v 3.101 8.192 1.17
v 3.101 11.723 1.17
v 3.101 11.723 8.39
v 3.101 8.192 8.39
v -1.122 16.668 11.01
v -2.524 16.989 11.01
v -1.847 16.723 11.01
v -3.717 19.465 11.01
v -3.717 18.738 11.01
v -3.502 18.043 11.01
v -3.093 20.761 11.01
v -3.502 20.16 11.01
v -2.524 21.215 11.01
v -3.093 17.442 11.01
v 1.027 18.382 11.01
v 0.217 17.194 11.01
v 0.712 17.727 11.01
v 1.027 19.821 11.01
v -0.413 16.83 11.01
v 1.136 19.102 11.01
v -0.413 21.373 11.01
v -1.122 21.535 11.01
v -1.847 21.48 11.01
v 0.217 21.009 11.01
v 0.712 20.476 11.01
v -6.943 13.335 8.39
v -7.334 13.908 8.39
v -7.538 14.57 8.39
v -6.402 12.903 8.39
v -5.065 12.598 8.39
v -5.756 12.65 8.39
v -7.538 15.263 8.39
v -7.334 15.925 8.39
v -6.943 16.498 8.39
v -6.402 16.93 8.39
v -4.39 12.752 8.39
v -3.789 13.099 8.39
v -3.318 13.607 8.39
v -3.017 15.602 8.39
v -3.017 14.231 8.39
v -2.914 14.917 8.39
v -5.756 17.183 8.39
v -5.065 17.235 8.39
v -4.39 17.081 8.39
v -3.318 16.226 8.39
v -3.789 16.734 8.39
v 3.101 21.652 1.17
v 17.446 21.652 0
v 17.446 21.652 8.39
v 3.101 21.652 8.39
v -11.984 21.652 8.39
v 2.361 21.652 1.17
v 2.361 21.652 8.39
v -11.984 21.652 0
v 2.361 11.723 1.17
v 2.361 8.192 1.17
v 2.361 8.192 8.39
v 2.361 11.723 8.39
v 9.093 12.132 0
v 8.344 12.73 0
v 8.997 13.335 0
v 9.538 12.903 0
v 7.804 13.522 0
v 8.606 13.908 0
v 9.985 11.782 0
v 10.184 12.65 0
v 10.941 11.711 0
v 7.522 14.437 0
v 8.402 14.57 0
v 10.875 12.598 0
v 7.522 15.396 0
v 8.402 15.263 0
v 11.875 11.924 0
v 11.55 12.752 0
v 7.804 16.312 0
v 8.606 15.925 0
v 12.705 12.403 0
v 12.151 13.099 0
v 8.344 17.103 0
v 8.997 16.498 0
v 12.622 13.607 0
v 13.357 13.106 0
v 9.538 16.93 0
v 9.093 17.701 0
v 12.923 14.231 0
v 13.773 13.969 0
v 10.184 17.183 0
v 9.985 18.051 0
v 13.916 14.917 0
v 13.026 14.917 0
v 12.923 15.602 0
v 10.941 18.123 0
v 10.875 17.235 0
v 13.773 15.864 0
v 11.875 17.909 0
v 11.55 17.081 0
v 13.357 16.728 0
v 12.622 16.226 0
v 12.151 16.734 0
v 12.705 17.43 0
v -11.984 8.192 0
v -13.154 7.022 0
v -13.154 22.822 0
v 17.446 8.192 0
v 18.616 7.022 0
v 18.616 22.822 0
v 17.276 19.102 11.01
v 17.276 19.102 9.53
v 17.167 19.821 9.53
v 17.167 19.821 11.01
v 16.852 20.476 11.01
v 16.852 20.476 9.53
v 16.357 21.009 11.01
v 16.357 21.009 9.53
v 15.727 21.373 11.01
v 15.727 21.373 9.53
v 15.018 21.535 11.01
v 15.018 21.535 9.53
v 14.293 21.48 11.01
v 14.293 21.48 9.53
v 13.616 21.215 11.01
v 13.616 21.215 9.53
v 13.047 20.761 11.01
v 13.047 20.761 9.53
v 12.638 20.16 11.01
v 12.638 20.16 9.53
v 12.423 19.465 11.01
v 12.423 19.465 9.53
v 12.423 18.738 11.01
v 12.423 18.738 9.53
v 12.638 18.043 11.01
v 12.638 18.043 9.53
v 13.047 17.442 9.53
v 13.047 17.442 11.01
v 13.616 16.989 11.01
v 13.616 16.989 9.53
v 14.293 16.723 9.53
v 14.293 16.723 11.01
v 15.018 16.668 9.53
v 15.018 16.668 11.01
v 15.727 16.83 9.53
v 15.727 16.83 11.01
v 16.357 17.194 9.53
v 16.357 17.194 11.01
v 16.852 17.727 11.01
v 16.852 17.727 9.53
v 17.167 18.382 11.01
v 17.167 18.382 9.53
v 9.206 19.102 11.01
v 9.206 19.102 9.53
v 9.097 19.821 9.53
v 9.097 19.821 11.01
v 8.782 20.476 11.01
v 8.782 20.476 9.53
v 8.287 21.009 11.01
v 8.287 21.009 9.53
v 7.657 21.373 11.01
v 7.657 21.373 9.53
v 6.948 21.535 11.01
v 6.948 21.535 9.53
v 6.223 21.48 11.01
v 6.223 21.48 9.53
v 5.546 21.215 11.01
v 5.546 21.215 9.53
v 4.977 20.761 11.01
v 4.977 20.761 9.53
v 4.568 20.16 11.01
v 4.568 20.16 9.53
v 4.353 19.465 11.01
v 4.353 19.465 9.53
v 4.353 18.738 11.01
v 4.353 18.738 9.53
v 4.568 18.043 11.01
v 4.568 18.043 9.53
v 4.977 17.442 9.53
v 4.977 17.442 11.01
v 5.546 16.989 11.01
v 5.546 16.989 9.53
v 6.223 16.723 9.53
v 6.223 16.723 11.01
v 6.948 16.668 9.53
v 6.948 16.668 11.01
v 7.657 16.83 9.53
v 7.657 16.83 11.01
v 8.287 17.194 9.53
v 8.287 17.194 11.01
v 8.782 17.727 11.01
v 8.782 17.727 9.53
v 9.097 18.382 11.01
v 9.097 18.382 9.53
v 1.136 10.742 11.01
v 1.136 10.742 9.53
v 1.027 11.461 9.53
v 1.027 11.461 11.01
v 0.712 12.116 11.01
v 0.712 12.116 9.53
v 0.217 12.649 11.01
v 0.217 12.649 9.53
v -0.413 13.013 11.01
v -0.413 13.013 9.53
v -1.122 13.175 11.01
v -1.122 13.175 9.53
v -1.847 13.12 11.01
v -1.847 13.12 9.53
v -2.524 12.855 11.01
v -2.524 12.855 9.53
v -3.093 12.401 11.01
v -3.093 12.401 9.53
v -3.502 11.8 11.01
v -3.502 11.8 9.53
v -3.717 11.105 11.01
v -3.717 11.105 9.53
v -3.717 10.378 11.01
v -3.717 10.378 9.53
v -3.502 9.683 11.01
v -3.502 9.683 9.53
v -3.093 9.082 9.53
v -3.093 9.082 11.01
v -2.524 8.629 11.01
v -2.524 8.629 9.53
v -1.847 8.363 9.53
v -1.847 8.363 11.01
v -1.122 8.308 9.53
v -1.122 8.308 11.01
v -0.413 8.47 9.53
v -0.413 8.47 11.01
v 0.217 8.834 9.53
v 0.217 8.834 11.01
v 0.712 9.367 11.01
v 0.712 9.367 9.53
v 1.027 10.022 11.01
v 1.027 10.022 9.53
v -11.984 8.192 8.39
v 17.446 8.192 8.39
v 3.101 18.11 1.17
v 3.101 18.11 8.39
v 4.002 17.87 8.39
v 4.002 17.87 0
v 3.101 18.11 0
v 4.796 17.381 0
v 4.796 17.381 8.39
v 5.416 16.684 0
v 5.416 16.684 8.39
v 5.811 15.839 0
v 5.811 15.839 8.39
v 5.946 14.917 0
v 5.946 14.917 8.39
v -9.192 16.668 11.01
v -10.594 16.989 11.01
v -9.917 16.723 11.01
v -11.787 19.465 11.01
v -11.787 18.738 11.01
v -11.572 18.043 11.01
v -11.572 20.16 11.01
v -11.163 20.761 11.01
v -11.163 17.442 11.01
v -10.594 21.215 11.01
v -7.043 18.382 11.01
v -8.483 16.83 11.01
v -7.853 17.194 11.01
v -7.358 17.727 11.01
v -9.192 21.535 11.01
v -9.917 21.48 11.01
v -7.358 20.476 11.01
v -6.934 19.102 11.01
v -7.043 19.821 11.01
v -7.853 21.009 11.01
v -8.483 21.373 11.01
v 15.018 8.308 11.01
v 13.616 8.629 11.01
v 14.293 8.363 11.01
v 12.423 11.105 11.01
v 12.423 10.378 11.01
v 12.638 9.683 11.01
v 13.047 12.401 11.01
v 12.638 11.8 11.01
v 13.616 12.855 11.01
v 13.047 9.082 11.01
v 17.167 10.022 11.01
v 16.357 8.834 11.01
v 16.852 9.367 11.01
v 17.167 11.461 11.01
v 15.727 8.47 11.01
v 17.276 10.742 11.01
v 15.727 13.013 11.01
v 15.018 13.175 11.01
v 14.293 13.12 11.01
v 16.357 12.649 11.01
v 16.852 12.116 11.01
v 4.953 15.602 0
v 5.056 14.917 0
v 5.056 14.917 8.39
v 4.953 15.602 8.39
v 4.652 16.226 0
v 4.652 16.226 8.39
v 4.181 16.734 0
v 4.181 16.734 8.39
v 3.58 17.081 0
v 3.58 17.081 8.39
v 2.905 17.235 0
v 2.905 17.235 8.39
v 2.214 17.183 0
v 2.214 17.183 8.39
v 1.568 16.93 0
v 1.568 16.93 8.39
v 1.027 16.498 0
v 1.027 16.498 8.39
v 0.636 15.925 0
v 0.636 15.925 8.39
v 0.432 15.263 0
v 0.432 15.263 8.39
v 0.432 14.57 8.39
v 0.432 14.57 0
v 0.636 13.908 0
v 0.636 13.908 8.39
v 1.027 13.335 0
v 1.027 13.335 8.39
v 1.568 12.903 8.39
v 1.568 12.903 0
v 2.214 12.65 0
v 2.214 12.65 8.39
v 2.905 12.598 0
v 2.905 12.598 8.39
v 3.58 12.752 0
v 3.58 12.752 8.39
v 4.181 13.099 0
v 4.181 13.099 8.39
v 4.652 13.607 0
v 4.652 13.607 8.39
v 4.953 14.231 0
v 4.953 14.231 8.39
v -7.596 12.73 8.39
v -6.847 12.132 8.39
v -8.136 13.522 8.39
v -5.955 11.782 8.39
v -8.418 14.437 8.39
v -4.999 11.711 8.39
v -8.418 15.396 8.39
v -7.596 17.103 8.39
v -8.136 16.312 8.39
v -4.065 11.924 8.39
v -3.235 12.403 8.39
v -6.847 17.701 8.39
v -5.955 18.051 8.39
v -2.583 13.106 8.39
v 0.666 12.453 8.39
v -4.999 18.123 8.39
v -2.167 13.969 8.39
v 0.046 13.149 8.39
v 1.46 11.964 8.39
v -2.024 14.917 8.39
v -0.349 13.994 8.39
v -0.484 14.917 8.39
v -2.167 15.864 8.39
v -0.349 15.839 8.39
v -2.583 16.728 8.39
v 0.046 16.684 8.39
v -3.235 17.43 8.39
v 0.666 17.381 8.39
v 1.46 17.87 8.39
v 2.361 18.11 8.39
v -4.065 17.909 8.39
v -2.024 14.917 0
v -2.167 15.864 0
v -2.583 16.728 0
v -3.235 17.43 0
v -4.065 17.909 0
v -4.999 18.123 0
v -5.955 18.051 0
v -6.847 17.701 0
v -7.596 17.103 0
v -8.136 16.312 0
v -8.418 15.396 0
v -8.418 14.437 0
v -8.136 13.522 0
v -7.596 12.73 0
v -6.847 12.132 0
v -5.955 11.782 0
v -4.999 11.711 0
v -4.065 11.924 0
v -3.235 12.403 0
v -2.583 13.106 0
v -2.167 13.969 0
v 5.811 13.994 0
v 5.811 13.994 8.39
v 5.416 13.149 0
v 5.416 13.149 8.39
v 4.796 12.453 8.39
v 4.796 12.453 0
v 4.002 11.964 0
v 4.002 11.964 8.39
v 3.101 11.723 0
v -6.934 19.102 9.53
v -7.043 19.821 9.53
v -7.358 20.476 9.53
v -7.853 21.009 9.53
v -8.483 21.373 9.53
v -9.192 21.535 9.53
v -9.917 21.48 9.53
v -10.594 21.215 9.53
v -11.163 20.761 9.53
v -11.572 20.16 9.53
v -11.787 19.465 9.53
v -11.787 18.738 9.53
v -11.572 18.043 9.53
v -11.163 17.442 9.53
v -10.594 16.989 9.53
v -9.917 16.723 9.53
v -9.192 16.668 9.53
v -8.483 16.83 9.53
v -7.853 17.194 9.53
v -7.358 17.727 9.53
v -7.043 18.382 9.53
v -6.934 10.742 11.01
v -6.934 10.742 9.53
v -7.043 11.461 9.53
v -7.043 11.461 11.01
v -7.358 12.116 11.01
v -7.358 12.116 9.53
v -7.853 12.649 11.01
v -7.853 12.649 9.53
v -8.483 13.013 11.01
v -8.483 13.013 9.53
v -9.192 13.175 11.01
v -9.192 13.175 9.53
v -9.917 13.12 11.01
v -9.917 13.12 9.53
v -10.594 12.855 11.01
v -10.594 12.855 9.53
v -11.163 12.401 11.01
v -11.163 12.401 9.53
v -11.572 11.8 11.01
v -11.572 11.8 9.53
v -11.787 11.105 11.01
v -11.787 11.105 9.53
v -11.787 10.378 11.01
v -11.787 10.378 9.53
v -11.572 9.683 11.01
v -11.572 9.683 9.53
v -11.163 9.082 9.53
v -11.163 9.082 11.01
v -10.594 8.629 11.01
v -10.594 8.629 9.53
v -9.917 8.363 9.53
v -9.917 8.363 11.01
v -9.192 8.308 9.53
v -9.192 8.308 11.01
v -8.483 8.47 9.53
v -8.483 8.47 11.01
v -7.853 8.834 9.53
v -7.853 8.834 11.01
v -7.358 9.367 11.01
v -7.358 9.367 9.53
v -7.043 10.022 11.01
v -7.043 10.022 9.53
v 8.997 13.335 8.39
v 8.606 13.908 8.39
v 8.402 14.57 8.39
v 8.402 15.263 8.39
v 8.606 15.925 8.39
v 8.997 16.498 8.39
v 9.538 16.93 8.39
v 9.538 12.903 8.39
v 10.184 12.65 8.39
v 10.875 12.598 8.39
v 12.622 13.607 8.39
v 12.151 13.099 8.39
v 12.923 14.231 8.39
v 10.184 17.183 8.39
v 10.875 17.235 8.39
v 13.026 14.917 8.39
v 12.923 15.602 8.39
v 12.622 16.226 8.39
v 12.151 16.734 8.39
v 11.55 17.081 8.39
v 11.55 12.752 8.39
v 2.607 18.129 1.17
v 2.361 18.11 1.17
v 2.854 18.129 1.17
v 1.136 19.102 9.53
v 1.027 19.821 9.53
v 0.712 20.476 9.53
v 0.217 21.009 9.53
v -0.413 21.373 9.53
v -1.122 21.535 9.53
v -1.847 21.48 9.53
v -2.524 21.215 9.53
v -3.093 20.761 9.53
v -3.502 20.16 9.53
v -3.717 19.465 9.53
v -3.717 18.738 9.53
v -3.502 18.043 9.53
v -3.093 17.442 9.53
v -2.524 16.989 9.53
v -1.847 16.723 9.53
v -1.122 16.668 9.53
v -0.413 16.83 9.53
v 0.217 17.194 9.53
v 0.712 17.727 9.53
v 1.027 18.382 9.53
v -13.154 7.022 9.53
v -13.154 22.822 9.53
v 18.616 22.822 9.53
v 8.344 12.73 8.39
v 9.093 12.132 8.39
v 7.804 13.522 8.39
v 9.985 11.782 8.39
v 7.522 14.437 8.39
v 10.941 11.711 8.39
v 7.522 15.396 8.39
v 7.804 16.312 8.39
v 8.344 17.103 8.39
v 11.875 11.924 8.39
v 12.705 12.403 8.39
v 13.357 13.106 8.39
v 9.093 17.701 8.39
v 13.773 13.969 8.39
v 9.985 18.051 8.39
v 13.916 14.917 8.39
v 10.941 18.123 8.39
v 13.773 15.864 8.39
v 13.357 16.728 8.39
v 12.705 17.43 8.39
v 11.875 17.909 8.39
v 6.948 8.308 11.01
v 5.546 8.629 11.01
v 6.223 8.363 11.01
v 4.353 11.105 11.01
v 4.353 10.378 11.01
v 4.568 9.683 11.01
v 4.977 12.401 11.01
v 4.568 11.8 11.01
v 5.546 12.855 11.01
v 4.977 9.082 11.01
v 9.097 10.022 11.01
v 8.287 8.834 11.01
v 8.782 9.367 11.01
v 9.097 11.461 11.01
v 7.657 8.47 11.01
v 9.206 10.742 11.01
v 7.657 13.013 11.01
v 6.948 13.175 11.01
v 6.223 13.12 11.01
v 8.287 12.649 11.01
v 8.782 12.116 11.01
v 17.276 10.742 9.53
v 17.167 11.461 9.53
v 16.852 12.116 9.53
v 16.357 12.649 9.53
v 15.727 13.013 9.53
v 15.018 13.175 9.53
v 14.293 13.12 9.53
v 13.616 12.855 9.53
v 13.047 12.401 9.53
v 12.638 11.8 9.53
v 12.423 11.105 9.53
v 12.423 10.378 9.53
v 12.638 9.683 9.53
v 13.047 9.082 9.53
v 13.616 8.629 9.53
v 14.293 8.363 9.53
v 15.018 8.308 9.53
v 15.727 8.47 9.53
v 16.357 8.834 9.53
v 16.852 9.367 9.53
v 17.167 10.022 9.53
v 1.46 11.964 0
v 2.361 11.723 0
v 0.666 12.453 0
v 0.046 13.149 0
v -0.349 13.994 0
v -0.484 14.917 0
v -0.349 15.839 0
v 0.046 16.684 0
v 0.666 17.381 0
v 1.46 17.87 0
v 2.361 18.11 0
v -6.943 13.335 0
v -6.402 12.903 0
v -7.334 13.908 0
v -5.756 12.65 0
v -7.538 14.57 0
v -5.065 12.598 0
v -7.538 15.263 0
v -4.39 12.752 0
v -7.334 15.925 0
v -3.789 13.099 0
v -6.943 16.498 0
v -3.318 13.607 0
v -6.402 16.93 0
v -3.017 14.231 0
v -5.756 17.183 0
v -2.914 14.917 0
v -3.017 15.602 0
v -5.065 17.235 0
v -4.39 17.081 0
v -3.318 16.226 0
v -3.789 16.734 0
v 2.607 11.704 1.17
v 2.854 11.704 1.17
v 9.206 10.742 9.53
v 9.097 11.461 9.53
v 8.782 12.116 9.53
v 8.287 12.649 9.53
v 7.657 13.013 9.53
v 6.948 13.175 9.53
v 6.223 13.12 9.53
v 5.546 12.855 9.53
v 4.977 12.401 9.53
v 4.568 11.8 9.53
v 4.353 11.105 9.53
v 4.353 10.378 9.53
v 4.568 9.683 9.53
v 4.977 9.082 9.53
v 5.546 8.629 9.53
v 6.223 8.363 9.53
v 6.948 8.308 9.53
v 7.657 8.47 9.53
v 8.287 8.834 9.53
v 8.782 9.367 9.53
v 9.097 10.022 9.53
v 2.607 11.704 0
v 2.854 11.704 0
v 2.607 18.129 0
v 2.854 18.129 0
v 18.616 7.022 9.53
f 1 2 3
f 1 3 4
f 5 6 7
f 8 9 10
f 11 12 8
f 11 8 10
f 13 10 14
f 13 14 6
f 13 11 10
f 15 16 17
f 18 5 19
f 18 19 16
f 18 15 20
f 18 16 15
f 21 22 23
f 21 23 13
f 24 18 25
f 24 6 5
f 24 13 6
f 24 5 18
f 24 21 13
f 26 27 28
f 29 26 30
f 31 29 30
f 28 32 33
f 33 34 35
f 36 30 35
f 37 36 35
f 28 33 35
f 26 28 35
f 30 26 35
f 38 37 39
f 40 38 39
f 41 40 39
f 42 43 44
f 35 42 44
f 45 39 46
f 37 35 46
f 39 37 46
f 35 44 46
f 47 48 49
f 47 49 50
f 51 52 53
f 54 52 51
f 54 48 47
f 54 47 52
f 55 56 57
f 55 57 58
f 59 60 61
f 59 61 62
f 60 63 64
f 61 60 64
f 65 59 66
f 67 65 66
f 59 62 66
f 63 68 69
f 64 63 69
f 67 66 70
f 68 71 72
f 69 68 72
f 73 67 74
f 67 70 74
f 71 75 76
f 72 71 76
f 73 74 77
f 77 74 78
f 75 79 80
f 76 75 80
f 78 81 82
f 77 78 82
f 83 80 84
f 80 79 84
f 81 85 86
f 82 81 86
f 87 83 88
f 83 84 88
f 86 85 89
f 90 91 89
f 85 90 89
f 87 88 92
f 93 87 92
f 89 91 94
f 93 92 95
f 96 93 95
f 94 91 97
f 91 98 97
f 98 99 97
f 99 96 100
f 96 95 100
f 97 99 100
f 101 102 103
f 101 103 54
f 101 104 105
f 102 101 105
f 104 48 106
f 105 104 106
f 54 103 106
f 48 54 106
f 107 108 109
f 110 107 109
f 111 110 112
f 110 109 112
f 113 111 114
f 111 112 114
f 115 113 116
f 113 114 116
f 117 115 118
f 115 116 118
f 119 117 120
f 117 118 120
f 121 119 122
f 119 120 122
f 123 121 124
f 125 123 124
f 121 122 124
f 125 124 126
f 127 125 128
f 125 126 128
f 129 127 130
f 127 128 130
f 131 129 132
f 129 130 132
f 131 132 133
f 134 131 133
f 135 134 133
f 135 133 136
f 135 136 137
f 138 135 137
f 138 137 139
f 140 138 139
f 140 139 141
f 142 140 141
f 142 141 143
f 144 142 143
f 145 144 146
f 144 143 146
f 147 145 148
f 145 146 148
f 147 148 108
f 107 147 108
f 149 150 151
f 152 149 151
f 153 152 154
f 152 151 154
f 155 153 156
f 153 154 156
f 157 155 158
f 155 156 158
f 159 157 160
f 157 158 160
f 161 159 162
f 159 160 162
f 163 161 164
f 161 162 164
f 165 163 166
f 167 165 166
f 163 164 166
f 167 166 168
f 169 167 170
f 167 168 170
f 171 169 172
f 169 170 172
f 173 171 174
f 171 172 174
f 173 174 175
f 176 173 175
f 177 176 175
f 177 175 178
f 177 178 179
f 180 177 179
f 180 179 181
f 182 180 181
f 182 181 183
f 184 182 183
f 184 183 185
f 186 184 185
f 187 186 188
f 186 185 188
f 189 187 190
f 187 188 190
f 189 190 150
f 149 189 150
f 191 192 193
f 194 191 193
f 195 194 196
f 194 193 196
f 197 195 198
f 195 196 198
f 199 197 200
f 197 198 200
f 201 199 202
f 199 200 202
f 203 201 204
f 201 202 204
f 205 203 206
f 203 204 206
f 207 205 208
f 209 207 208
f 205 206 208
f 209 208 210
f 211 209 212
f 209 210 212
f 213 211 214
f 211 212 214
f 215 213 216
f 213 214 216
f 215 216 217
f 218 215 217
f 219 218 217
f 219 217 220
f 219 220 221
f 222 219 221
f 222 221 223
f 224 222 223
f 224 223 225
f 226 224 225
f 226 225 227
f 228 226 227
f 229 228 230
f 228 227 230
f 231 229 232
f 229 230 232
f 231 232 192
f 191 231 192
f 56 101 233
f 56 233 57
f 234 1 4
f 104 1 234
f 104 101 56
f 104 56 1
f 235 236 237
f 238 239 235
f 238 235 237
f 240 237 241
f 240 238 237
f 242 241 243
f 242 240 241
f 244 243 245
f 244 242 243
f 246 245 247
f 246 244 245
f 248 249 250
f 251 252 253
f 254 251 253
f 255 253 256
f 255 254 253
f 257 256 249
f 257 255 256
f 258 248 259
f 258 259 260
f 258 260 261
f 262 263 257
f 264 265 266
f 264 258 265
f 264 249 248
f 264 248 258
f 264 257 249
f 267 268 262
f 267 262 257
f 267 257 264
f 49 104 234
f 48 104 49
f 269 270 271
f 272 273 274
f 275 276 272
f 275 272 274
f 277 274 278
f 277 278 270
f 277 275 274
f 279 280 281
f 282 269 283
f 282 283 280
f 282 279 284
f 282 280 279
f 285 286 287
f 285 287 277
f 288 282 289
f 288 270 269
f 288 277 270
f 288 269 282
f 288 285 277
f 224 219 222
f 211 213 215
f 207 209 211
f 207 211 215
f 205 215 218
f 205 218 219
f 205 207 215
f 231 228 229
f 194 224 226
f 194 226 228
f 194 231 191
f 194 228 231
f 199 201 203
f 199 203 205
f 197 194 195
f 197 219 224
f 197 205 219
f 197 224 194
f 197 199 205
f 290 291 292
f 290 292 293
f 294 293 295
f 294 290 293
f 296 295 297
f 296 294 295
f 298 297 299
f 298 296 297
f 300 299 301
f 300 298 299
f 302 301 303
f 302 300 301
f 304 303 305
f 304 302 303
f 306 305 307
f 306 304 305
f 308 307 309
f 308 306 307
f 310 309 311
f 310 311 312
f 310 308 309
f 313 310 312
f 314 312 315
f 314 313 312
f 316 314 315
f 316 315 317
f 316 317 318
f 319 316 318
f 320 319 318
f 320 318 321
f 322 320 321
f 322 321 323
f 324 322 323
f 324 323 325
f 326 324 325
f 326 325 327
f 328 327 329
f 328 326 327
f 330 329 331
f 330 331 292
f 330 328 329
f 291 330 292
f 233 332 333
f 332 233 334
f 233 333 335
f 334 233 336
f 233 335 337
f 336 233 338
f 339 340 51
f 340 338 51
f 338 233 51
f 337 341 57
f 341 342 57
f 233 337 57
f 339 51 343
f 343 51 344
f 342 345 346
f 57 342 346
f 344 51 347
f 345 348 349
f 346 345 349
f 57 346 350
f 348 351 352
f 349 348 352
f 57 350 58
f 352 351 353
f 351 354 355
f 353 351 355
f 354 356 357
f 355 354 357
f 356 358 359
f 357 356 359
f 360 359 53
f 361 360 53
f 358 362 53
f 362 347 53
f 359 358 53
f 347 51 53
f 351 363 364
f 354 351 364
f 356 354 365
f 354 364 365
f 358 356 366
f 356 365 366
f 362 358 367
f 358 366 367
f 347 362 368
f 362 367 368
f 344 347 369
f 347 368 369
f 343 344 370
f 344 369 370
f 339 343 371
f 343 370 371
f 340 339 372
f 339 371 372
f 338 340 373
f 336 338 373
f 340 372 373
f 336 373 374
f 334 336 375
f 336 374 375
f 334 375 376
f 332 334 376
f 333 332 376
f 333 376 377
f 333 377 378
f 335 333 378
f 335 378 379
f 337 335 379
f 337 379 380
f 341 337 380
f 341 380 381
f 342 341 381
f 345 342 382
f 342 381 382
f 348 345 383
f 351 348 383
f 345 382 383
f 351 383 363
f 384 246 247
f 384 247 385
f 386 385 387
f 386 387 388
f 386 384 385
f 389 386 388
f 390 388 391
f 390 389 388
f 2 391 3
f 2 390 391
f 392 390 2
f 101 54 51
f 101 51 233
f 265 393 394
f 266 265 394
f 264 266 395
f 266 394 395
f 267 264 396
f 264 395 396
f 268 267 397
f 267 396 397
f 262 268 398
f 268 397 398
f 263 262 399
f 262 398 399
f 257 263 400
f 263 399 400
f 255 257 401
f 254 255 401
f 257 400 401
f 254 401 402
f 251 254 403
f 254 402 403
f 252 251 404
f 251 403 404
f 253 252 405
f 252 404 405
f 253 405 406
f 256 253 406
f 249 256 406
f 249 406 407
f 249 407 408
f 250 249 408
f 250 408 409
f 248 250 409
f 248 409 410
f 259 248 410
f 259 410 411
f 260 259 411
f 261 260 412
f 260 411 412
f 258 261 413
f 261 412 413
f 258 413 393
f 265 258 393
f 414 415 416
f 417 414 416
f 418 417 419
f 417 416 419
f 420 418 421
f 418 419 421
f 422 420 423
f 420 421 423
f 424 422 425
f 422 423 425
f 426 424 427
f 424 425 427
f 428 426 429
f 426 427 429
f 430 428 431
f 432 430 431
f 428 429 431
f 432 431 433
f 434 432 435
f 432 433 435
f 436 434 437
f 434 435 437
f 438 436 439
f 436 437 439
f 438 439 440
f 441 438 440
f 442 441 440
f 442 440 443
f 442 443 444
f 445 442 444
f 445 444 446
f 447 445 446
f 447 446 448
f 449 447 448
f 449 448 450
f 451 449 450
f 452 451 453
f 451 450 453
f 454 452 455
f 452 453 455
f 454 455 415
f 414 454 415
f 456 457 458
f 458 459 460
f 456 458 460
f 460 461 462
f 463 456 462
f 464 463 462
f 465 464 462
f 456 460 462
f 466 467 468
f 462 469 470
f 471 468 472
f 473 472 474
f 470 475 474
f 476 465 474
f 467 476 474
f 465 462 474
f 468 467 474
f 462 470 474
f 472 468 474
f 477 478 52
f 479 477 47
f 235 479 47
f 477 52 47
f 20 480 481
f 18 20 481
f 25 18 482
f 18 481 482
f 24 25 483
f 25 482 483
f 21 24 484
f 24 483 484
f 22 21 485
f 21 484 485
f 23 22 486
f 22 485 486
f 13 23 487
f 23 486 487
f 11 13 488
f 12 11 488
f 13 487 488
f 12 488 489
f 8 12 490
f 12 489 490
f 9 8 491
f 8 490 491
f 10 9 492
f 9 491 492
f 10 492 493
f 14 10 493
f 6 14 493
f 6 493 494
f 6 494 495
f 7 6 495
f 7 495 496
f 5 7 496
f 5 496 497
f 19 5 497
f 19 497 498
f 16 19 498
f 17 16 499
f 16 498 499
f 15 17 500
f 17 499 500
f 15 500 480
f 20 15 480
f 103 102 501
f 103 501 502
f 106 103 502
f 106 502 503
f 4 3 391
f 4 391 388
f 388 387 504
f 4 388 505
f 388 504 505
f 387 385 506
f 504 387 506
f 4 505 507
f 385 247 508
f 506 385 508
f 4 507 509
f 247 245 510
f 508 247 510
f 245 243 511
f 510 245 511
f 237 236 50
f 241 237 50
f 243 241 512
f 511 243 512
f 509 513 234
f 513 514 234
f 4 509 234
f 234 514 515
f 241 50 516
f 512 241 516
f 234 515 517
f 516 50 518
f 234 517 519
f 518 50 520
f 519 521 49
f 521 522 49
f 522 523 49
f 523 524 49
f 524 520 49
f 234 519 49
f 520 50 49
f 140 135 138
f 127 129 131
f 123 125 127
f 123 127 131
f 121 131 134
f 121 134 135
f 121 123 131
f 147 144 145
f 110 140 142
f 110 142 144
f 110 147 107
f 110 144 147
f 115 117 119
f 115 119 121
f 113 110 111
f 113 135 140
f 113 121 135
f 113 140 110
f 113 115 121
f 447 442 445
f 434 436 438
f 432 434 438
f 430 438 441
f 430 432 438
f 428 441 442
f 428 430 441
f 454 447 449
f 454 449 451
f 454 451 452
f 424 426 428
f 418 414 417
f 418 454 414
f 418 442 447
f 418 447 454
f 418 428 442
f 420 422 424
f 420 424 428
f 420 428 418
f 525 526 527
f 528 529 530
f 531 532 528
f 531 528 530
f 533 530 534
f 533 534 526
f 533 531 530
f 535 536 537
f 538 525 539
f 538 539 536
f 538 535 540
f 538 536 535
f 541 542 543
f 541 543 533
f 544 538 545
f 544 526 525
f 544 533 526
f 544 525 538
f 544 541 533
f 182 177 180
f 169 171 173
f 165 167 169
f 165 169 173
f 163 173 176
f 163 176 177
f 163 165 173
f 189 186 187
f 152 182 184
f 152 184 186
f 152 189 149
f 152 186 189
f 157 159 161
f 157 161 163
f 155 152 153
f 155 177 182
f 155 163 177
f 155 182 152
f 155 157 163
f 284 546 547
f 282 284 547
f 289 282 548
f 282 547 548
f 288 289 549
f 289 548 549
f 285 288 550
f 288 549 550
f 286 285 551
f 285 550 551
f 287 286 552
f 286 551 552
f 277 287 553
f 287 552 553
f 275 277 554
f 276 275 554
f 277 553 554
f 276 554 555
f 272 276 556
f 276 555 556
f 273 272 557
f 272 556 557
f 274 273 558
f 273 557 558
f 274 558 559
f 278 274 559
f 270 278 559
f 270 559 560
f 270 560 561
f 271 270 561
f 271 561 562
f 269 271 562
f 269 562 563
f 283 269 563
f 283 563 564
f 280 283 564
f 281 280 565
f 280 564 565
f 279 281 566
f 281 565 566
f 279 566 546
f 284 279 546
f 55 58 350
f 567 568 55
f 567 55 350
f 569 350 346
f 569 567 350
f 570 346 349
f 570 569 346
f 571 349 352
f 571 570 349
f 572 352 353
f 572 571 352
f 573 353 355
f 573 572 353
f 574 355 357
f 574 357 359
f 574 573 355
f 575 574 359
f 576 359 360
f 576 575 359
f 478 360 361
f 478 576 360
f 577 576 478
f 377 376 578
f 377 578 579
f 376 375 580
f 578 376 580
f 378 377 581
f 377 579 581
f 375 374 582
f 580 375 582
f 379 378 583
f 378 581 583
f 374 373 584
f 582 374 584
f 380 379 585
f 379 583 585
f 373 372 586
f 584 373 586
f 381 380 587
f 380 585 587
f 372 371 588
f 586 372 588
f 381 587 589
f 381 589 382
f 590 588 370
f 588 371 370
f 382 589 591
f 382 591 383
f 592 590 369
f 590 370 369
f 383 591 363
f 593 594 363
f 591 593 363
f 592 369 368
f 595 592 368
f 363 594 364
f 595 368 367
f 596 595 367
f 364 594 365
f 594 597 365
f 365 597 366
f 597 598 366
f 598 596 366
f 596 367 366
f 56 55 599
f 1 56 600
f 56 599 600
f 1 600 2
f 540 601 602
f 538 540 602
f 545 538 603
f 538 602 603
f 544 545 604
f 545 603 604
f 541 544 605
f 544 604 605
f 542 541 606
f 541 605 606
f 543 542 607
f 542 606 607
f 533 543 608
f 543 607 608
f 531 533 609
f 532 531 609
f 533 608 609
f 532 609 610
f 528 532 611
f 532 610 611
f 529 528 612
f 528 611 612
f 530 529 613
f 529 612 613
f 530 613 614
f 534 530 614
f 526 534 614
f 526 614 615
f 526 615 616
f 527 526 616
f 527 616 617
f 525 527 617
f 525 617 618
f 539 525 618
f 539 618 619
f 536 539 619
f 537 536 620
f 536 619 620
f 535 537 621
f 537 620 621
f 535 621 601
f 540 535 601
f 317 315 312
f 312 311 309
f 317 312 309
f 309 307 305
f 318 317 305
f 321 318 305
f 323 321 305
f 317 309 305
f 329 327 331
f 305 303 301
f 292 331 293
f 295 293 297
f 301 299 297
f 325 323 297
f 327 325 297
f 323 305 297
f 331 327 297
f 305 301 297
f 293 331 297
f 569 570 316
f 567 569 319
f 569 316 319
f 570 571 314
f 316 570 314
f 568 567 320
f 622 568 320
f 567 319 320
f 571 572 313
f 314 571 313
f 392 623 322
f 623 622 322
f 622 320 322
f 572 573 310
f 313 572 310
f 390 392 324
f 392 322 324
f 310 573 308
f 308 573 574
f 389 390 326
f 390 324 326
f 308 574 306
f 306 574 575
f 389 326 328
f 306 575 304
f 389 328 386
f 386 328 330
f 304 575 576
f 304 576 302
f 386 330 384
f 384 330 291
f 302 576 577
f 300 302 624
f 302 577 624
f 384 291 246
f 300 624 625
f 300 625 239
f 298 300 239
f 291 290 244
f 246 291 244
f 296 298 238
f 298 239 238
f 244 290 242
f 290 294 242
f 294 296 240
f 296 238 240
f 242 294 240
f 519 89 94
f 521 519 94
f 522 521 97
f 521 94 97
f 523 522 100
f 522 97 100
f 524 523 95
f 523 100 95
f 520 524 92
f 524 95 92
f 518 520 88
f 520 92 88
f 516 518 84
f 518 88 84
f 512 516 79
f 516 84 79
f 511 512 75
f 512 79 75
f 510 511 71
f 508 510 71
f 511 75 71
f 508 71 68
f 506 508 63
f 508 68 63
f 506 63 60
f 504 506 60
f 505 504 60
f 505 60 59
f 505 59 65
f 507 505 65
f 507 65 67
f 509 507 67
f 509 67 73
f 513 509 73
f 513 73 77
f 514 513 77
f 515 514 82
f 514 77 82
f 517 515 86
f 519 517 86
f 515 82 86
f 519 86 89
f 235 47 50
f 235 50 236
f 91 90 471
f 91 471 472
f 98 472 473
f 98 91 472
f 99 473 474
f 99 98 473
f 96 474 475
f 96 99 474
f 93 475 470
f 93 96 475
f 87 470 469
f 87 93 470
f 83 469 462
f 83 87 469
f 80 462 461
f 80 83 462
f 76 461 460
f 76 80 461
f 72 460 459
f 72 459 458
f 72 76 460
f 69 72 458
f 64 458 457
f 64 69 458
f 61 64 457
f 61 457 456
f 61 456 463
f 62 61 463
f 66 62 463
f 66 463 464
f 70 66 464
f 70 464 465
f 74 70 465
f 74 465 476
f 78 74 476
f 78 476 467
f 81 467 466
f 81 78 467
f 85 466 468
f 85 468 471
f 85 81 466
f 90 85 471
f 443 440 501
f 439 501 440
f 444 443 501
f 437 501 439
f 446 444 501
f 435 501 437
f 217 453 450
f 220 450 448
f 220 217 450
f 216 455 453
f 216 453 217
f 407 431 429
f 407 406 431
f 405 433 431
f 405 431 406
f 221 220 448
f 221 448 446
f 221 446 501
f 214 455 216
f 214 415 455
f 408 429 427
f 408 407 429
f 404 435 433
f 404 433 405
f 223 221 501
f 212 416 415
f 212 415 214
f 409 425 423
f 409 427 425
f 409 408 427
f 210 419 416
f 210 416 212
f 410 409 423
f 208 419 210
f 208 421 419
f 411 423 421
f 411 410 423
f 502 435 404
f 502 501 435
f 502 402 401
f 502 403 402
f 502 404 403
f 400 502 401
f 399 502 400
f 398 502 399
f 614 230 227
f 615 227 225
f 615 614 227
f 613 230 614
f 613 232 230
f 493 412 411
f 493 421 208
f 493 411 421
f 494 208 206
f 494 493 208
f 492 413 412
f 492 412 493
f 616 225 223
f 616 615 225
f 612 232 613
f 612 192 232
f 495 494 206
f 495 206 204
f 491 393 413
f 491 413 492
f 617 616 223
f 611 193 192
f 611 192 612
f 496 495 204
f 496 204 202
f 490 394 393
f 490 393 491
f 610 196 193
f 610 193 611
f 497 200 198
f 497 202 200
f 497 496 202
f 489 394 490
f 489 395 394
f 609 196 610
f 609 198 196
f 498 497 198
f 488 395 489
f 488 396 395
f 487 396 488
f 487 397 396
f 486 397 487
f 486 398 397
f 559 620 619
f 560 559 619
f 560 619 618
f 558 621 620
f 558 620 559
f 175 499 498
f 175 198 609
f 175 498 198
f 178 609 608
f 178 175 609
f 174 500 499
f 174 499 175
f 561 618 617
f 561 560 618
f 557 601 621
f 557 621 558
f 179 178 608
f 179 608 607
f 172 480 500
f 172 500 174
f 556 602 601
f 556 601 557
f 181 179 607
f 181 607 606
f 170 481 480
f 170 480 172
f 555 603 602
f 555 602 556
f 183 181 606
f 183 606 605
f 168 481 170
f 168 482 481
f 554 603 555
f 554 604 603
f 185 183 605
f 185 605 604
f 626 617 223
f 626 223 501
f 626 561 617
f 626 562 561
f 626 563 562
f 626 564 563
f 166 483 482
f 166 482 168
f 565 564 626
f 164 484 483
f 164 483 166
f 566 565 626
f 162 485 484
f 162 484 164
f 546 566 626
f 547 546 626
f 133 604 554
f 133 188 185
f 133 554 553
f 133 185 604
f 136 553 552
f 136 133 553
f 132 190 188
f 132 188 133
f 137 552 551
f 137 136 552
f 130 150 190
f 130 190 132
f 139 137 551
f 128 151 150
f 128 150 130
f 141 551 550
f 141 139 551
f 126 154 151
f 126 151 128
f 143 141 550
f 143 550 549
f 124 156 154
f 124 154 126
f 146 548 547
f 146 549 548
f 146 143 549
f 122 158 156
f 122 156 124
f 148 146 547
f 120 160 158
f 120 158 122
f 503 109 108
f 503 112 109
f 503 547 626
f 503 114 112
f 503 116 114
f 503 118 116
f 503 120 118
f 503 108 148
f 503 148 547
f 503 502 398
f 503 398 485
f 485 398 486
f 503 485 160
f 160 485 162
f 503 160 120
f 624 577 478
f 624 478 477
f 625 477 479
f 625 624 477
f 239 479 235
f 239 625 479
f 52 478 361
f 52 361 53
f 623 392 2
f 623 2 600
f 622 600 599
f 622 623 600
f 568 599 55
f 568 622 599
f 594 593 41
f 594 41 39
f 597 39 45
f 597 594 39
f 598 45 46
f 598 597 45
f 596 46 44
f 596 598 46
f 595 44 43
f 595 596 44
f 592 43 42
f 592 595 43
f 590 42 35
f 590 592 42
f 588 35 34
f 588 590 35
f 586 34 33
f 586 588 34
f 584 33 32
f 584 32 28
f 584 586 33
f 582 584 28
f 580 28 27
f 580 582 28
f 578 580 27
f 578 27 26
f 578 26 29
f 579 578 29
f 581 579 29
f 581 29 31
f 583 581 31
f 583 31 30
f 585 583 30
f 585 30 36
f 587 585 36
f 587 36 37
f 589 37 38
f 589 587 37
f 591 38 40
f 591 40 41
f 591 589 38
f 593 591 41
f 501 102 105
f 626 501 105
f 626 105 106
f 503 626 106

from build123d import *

# Parameters (mm, degrees)
F0_W     = 31.77
F0_H     = 15.8
F0_R     = 3.215
F0_R_2   = 2.325
F1_DEPTH = 9.53
F2_DEPTH = 8.39
F3_DEPTH = 1.17
F4_R     = 2.44
F5_DEPTH = 1.48


with BuildPart() as f1:
    # F0 (on Top) → F1 (new body)
    with BuildSketch(Plane.XY):
        with Locations((2.730887816, 14.921668646)):
            Rectangle(F0_W, F0_H)
        Polygon((2.360887816, 8.191668646), (-11.984112184, 8.191668646), (-11.984112184, 21.651668646), (2.360887816, 21.651668646), (3.100887816, 21.651668646), (17.445887816, 21.651668646), (17.445887816, 8.191668646), (3.100887816, 8.191668646), align=None, mode=Mode.SUBTRACT)
        with BuildLine():
            Line((-11.984112184, 21.651668646), (-11.984112184, 8.191668646))
            Line((-11.984112184, 8.191668646), (2.360887816, 8.191668646))
            Line((2.360887816, 8.191668646), (2.360887816, 11.7230304386))
            ThreePointArc((2.360887816, 11.7230304386), (-0.484112184, 14.916668646), (2.360887816, 18.1103068535))
            Line((2.360887816, 18.1103068535), (2.360887816, 21.651668646))
            Line((2.360887816, 21.651668646), (-11.984112184, 21.651668646))
        make_face()
        with Locations((-5.239112184, 14.916668646)):
            Circle(F0_R, mode=Mode.SUBTRACT)
        with BuildLine():
            Line((3.100887816, 11.7230304386), (3.100887816, 8.191668646))
            Line((3.100887816, 8.191668646), (17.445887816, 8.191668646))
            Line((17.445887816, 8.191668646), (17.445887816, 21.651668646))
            Line((17.445887816, 21.651668646), (3.100887816, 21.651668646))
            Line((3.100887816, 21.651668646), (3.100887816, 18.1103068535))
            ThreePointArc((3.100887816, 18.1103068535), (5.1314893031, 17.0552049445), (5.945887816, 14.916668646))
            ThreePointArc((5.945887816, 14.916668646), (5.1314893031, 12.7781323475), (3.100887816, 11.7230304386))
        make_face()
        with Locations((10.700887816, 14.916668646)):
            Circle(F0_R, mode=Mode.SUBTRACT)
        with BuildLine():
            ThreePointArc((2.360887816, 18.1103068535), (-0.484112184, 14.916668646), (2.360887816, 11.7230304386))
            ThreePointArc((2.360887816, 11.7230304386), (2.730887816, 11.701668646), (3.100887816, 11.7230304386))
            ThreePointArc((3.100887816, 11.7230304386), (5.1314893031, 12.7781323475), (5.945887816, 14.916668646))
            ThreePointArc((5.945887816, 14.916668646), (5.1314893031, 17.0552049445), (3.100887816, 18.1103068535))
            ThreePointArc((3.100887816, 18.1103068535), (2.730887816, 18.131668646), (2.360887816, 18.1103068535))
        make_face()
        with Locations((2.730887816, 14.916668646)):
            Circle(F0_R_2, mode=Mode.SUBTRACT)
        with Locations((10.700887816, 14.916668646)):
            Circle(F0_R)
        with Locations((10.700887816, 14.916668646)):
            Circle(F0_R_2, mode=Mode.SUBTRACT)
        with Locations((-5.239112184, 14.916668646)):
            Circle(F0_R)
        with Locations((-5.239112184, 14.916668646)):
            Circle(F0_R_2, mode=Mode.SUBTRACT)
        with Locations((10.700887816, 14.916668646)):
            Circle(F0_R_2)
        with Locations((-5.239112184, 14.916668646)):
            Circle(F0_R_2)
        with Locations((2.730887816, 14.916668646)):
            Circle(F0_R_2)
        with BuildLine():
            Line((3.100887816, 21.651668646), (2.360887816, 21.651668646))
            Line((2.360887816, 21.651668646), (2.360887816, 18.1103068535))
            ThreePointArc((2.360887816, 18.1103068535), (2.730887816, 18.131668646), (3.100887816, 18.1103068535))
            Line((3.100887816, 18.1103068535), (3.100887816, 21.651668646))
        make_face()
        with BuildLine():
            Line((2.360887816, 11.7230304386), (2.360887816, 8.191668646))
            Line((2.360887816, 8.191668646), (3.100887816, 8.191668646))
            Line((3.100887816, 8.191668646), (3.100887816, 11.7230304386))
            ThreePointArc((3.100887816, 11.7230304386), (2.730887816, 11.701668646), (2.360887816, 11.7230304386))
        make_face()
    extrude(amount=F1_DEPTH)

    # F0 (on Top) → F2 (cut)
    with BuildSketch(Plane.XY):
        with BuildLine():
            Line((-11.984112184, 21.651668646), (-11.984112184, 8.191668646))
            Line((-11.984112184, 8.191668646), (2.360887816, 8.191668646))
            Line((2.360887816, 8.191668646), (2.360887816, 11.7230304386))
            ThreePointArc((2.360887816, 11.7230304386), (-0.484112184, 14.916668646), (2.360887816, 18.1103068535))
            Line((2.360887816, 18.1103068535), (2.360887816, 21.651668646))
            Line((2.360887816, 21.651668646), (-11.984112184, 21.651668646))
        make_face()
        with Locations((-5.239112184, 14.916668646)):
            Circle(F0_R, mode=Mode.SUBTRACT)
        with BuildLine():
            Line((3.100887816, 11.7230304386), (3.100887816, 8.191668646))
            Line((3.100887816, 8.191668646), (17.445887816, 8.191668646))
            Line((17.445887816, 8.191668646), (17.445887816, 21.651668646))
            Line((17.445887816, 21.651668646), (3.100887816, 21.651668646))
            Line((3.100887816, 21.651668646), (3.100887816, 18.1103068535))
            ThreePointArc((3.100887816, 18.1103068535), (5.1314893031, 17.0552049445), (5.945887816, 14.916668646))
            ThreePointArc((5.945887816, 14.916668646), (5.1314893031, 12.7781323475), (3.100887816, 11.7230304386))
        make_face()
        with Locations((10.700887816, 14.916668646)):
            Circle(F0_R, mode=Mode.SUBTRACT)
        with Locations((10.700887816, 14.916668646)):
            Circle(F0_R_2)
        with Locations((2.730887816, 14.916668646)):
            Circle(F0_R_2)
        with Locations((-5.239112184, 14.916668646)):
            Circle(F0_R_2)
    extrude(amount=F2_DEPTH, mode=Mode.SUBTRACT)

    # F0 (on Top) → F3 (cut)
    with BuildSketch(Plane.XY):
        with BuildLine():
            Line((2.360887816, 11.7230304386), (2.360887816, 8.191668646))
            Line((2.360887816, 8.191668646), (3.100887816, 8.191668646))
            Line((3.100887816, 8.191668646), (3.100887816, 11.7230304386))
            ThreePointArc((3.100887816, 11.7230304386), (2.730887816, 11.701668646), (2.360887816, 11.7230304386))
        make_face()
        with BuildLine():
            Line((3.100887816, 21.651668646), (2.360887816, 21.651668646))
            Line((2.360887816, 21.651668646), (2.360887816, 18.1103068535))
            ThreePointArc((2.360887816, 18.1103068535), (2.730887816, 18.131668646), (3.100887816, 18.1103068535))
            Line((3.100887816, 18.1103068535), (3.100887816, 21.651668646))
        make_face()
    extrude(amount=F3_DEPTH, mode=Mode.SUBTRACT)

    # F4 (on face) → F5 (join)
    with BuildSketch(Plane.XY.offset(9.53)):
        with Locations((-9.374112184, 19.101668646)):
            Circle(F4_R)
        with Locations((-9.374112184, 10.741668646)):
            Circle(F4_R)
        with Locations((-1.304112184, 19.101668646)):
            Circle(F4_R)
        with Locations((-1.304112184, 10.741668646)):
            Circle(F4_R)
        with Locations((6.765887816, 19.101668646)):
            Circle(F4_R)
        with Locations((6.765887816, 10.741668646)):
            Circle(F4_R)
        with Locations((14.835887816, 19.101668646)):
            Circle(F4_R)
        with Locations((14.835887816, 10.741668646)):
            Circle(F4_R)
    extrude(amount=F5_DEPTH)


solid = f1.part
